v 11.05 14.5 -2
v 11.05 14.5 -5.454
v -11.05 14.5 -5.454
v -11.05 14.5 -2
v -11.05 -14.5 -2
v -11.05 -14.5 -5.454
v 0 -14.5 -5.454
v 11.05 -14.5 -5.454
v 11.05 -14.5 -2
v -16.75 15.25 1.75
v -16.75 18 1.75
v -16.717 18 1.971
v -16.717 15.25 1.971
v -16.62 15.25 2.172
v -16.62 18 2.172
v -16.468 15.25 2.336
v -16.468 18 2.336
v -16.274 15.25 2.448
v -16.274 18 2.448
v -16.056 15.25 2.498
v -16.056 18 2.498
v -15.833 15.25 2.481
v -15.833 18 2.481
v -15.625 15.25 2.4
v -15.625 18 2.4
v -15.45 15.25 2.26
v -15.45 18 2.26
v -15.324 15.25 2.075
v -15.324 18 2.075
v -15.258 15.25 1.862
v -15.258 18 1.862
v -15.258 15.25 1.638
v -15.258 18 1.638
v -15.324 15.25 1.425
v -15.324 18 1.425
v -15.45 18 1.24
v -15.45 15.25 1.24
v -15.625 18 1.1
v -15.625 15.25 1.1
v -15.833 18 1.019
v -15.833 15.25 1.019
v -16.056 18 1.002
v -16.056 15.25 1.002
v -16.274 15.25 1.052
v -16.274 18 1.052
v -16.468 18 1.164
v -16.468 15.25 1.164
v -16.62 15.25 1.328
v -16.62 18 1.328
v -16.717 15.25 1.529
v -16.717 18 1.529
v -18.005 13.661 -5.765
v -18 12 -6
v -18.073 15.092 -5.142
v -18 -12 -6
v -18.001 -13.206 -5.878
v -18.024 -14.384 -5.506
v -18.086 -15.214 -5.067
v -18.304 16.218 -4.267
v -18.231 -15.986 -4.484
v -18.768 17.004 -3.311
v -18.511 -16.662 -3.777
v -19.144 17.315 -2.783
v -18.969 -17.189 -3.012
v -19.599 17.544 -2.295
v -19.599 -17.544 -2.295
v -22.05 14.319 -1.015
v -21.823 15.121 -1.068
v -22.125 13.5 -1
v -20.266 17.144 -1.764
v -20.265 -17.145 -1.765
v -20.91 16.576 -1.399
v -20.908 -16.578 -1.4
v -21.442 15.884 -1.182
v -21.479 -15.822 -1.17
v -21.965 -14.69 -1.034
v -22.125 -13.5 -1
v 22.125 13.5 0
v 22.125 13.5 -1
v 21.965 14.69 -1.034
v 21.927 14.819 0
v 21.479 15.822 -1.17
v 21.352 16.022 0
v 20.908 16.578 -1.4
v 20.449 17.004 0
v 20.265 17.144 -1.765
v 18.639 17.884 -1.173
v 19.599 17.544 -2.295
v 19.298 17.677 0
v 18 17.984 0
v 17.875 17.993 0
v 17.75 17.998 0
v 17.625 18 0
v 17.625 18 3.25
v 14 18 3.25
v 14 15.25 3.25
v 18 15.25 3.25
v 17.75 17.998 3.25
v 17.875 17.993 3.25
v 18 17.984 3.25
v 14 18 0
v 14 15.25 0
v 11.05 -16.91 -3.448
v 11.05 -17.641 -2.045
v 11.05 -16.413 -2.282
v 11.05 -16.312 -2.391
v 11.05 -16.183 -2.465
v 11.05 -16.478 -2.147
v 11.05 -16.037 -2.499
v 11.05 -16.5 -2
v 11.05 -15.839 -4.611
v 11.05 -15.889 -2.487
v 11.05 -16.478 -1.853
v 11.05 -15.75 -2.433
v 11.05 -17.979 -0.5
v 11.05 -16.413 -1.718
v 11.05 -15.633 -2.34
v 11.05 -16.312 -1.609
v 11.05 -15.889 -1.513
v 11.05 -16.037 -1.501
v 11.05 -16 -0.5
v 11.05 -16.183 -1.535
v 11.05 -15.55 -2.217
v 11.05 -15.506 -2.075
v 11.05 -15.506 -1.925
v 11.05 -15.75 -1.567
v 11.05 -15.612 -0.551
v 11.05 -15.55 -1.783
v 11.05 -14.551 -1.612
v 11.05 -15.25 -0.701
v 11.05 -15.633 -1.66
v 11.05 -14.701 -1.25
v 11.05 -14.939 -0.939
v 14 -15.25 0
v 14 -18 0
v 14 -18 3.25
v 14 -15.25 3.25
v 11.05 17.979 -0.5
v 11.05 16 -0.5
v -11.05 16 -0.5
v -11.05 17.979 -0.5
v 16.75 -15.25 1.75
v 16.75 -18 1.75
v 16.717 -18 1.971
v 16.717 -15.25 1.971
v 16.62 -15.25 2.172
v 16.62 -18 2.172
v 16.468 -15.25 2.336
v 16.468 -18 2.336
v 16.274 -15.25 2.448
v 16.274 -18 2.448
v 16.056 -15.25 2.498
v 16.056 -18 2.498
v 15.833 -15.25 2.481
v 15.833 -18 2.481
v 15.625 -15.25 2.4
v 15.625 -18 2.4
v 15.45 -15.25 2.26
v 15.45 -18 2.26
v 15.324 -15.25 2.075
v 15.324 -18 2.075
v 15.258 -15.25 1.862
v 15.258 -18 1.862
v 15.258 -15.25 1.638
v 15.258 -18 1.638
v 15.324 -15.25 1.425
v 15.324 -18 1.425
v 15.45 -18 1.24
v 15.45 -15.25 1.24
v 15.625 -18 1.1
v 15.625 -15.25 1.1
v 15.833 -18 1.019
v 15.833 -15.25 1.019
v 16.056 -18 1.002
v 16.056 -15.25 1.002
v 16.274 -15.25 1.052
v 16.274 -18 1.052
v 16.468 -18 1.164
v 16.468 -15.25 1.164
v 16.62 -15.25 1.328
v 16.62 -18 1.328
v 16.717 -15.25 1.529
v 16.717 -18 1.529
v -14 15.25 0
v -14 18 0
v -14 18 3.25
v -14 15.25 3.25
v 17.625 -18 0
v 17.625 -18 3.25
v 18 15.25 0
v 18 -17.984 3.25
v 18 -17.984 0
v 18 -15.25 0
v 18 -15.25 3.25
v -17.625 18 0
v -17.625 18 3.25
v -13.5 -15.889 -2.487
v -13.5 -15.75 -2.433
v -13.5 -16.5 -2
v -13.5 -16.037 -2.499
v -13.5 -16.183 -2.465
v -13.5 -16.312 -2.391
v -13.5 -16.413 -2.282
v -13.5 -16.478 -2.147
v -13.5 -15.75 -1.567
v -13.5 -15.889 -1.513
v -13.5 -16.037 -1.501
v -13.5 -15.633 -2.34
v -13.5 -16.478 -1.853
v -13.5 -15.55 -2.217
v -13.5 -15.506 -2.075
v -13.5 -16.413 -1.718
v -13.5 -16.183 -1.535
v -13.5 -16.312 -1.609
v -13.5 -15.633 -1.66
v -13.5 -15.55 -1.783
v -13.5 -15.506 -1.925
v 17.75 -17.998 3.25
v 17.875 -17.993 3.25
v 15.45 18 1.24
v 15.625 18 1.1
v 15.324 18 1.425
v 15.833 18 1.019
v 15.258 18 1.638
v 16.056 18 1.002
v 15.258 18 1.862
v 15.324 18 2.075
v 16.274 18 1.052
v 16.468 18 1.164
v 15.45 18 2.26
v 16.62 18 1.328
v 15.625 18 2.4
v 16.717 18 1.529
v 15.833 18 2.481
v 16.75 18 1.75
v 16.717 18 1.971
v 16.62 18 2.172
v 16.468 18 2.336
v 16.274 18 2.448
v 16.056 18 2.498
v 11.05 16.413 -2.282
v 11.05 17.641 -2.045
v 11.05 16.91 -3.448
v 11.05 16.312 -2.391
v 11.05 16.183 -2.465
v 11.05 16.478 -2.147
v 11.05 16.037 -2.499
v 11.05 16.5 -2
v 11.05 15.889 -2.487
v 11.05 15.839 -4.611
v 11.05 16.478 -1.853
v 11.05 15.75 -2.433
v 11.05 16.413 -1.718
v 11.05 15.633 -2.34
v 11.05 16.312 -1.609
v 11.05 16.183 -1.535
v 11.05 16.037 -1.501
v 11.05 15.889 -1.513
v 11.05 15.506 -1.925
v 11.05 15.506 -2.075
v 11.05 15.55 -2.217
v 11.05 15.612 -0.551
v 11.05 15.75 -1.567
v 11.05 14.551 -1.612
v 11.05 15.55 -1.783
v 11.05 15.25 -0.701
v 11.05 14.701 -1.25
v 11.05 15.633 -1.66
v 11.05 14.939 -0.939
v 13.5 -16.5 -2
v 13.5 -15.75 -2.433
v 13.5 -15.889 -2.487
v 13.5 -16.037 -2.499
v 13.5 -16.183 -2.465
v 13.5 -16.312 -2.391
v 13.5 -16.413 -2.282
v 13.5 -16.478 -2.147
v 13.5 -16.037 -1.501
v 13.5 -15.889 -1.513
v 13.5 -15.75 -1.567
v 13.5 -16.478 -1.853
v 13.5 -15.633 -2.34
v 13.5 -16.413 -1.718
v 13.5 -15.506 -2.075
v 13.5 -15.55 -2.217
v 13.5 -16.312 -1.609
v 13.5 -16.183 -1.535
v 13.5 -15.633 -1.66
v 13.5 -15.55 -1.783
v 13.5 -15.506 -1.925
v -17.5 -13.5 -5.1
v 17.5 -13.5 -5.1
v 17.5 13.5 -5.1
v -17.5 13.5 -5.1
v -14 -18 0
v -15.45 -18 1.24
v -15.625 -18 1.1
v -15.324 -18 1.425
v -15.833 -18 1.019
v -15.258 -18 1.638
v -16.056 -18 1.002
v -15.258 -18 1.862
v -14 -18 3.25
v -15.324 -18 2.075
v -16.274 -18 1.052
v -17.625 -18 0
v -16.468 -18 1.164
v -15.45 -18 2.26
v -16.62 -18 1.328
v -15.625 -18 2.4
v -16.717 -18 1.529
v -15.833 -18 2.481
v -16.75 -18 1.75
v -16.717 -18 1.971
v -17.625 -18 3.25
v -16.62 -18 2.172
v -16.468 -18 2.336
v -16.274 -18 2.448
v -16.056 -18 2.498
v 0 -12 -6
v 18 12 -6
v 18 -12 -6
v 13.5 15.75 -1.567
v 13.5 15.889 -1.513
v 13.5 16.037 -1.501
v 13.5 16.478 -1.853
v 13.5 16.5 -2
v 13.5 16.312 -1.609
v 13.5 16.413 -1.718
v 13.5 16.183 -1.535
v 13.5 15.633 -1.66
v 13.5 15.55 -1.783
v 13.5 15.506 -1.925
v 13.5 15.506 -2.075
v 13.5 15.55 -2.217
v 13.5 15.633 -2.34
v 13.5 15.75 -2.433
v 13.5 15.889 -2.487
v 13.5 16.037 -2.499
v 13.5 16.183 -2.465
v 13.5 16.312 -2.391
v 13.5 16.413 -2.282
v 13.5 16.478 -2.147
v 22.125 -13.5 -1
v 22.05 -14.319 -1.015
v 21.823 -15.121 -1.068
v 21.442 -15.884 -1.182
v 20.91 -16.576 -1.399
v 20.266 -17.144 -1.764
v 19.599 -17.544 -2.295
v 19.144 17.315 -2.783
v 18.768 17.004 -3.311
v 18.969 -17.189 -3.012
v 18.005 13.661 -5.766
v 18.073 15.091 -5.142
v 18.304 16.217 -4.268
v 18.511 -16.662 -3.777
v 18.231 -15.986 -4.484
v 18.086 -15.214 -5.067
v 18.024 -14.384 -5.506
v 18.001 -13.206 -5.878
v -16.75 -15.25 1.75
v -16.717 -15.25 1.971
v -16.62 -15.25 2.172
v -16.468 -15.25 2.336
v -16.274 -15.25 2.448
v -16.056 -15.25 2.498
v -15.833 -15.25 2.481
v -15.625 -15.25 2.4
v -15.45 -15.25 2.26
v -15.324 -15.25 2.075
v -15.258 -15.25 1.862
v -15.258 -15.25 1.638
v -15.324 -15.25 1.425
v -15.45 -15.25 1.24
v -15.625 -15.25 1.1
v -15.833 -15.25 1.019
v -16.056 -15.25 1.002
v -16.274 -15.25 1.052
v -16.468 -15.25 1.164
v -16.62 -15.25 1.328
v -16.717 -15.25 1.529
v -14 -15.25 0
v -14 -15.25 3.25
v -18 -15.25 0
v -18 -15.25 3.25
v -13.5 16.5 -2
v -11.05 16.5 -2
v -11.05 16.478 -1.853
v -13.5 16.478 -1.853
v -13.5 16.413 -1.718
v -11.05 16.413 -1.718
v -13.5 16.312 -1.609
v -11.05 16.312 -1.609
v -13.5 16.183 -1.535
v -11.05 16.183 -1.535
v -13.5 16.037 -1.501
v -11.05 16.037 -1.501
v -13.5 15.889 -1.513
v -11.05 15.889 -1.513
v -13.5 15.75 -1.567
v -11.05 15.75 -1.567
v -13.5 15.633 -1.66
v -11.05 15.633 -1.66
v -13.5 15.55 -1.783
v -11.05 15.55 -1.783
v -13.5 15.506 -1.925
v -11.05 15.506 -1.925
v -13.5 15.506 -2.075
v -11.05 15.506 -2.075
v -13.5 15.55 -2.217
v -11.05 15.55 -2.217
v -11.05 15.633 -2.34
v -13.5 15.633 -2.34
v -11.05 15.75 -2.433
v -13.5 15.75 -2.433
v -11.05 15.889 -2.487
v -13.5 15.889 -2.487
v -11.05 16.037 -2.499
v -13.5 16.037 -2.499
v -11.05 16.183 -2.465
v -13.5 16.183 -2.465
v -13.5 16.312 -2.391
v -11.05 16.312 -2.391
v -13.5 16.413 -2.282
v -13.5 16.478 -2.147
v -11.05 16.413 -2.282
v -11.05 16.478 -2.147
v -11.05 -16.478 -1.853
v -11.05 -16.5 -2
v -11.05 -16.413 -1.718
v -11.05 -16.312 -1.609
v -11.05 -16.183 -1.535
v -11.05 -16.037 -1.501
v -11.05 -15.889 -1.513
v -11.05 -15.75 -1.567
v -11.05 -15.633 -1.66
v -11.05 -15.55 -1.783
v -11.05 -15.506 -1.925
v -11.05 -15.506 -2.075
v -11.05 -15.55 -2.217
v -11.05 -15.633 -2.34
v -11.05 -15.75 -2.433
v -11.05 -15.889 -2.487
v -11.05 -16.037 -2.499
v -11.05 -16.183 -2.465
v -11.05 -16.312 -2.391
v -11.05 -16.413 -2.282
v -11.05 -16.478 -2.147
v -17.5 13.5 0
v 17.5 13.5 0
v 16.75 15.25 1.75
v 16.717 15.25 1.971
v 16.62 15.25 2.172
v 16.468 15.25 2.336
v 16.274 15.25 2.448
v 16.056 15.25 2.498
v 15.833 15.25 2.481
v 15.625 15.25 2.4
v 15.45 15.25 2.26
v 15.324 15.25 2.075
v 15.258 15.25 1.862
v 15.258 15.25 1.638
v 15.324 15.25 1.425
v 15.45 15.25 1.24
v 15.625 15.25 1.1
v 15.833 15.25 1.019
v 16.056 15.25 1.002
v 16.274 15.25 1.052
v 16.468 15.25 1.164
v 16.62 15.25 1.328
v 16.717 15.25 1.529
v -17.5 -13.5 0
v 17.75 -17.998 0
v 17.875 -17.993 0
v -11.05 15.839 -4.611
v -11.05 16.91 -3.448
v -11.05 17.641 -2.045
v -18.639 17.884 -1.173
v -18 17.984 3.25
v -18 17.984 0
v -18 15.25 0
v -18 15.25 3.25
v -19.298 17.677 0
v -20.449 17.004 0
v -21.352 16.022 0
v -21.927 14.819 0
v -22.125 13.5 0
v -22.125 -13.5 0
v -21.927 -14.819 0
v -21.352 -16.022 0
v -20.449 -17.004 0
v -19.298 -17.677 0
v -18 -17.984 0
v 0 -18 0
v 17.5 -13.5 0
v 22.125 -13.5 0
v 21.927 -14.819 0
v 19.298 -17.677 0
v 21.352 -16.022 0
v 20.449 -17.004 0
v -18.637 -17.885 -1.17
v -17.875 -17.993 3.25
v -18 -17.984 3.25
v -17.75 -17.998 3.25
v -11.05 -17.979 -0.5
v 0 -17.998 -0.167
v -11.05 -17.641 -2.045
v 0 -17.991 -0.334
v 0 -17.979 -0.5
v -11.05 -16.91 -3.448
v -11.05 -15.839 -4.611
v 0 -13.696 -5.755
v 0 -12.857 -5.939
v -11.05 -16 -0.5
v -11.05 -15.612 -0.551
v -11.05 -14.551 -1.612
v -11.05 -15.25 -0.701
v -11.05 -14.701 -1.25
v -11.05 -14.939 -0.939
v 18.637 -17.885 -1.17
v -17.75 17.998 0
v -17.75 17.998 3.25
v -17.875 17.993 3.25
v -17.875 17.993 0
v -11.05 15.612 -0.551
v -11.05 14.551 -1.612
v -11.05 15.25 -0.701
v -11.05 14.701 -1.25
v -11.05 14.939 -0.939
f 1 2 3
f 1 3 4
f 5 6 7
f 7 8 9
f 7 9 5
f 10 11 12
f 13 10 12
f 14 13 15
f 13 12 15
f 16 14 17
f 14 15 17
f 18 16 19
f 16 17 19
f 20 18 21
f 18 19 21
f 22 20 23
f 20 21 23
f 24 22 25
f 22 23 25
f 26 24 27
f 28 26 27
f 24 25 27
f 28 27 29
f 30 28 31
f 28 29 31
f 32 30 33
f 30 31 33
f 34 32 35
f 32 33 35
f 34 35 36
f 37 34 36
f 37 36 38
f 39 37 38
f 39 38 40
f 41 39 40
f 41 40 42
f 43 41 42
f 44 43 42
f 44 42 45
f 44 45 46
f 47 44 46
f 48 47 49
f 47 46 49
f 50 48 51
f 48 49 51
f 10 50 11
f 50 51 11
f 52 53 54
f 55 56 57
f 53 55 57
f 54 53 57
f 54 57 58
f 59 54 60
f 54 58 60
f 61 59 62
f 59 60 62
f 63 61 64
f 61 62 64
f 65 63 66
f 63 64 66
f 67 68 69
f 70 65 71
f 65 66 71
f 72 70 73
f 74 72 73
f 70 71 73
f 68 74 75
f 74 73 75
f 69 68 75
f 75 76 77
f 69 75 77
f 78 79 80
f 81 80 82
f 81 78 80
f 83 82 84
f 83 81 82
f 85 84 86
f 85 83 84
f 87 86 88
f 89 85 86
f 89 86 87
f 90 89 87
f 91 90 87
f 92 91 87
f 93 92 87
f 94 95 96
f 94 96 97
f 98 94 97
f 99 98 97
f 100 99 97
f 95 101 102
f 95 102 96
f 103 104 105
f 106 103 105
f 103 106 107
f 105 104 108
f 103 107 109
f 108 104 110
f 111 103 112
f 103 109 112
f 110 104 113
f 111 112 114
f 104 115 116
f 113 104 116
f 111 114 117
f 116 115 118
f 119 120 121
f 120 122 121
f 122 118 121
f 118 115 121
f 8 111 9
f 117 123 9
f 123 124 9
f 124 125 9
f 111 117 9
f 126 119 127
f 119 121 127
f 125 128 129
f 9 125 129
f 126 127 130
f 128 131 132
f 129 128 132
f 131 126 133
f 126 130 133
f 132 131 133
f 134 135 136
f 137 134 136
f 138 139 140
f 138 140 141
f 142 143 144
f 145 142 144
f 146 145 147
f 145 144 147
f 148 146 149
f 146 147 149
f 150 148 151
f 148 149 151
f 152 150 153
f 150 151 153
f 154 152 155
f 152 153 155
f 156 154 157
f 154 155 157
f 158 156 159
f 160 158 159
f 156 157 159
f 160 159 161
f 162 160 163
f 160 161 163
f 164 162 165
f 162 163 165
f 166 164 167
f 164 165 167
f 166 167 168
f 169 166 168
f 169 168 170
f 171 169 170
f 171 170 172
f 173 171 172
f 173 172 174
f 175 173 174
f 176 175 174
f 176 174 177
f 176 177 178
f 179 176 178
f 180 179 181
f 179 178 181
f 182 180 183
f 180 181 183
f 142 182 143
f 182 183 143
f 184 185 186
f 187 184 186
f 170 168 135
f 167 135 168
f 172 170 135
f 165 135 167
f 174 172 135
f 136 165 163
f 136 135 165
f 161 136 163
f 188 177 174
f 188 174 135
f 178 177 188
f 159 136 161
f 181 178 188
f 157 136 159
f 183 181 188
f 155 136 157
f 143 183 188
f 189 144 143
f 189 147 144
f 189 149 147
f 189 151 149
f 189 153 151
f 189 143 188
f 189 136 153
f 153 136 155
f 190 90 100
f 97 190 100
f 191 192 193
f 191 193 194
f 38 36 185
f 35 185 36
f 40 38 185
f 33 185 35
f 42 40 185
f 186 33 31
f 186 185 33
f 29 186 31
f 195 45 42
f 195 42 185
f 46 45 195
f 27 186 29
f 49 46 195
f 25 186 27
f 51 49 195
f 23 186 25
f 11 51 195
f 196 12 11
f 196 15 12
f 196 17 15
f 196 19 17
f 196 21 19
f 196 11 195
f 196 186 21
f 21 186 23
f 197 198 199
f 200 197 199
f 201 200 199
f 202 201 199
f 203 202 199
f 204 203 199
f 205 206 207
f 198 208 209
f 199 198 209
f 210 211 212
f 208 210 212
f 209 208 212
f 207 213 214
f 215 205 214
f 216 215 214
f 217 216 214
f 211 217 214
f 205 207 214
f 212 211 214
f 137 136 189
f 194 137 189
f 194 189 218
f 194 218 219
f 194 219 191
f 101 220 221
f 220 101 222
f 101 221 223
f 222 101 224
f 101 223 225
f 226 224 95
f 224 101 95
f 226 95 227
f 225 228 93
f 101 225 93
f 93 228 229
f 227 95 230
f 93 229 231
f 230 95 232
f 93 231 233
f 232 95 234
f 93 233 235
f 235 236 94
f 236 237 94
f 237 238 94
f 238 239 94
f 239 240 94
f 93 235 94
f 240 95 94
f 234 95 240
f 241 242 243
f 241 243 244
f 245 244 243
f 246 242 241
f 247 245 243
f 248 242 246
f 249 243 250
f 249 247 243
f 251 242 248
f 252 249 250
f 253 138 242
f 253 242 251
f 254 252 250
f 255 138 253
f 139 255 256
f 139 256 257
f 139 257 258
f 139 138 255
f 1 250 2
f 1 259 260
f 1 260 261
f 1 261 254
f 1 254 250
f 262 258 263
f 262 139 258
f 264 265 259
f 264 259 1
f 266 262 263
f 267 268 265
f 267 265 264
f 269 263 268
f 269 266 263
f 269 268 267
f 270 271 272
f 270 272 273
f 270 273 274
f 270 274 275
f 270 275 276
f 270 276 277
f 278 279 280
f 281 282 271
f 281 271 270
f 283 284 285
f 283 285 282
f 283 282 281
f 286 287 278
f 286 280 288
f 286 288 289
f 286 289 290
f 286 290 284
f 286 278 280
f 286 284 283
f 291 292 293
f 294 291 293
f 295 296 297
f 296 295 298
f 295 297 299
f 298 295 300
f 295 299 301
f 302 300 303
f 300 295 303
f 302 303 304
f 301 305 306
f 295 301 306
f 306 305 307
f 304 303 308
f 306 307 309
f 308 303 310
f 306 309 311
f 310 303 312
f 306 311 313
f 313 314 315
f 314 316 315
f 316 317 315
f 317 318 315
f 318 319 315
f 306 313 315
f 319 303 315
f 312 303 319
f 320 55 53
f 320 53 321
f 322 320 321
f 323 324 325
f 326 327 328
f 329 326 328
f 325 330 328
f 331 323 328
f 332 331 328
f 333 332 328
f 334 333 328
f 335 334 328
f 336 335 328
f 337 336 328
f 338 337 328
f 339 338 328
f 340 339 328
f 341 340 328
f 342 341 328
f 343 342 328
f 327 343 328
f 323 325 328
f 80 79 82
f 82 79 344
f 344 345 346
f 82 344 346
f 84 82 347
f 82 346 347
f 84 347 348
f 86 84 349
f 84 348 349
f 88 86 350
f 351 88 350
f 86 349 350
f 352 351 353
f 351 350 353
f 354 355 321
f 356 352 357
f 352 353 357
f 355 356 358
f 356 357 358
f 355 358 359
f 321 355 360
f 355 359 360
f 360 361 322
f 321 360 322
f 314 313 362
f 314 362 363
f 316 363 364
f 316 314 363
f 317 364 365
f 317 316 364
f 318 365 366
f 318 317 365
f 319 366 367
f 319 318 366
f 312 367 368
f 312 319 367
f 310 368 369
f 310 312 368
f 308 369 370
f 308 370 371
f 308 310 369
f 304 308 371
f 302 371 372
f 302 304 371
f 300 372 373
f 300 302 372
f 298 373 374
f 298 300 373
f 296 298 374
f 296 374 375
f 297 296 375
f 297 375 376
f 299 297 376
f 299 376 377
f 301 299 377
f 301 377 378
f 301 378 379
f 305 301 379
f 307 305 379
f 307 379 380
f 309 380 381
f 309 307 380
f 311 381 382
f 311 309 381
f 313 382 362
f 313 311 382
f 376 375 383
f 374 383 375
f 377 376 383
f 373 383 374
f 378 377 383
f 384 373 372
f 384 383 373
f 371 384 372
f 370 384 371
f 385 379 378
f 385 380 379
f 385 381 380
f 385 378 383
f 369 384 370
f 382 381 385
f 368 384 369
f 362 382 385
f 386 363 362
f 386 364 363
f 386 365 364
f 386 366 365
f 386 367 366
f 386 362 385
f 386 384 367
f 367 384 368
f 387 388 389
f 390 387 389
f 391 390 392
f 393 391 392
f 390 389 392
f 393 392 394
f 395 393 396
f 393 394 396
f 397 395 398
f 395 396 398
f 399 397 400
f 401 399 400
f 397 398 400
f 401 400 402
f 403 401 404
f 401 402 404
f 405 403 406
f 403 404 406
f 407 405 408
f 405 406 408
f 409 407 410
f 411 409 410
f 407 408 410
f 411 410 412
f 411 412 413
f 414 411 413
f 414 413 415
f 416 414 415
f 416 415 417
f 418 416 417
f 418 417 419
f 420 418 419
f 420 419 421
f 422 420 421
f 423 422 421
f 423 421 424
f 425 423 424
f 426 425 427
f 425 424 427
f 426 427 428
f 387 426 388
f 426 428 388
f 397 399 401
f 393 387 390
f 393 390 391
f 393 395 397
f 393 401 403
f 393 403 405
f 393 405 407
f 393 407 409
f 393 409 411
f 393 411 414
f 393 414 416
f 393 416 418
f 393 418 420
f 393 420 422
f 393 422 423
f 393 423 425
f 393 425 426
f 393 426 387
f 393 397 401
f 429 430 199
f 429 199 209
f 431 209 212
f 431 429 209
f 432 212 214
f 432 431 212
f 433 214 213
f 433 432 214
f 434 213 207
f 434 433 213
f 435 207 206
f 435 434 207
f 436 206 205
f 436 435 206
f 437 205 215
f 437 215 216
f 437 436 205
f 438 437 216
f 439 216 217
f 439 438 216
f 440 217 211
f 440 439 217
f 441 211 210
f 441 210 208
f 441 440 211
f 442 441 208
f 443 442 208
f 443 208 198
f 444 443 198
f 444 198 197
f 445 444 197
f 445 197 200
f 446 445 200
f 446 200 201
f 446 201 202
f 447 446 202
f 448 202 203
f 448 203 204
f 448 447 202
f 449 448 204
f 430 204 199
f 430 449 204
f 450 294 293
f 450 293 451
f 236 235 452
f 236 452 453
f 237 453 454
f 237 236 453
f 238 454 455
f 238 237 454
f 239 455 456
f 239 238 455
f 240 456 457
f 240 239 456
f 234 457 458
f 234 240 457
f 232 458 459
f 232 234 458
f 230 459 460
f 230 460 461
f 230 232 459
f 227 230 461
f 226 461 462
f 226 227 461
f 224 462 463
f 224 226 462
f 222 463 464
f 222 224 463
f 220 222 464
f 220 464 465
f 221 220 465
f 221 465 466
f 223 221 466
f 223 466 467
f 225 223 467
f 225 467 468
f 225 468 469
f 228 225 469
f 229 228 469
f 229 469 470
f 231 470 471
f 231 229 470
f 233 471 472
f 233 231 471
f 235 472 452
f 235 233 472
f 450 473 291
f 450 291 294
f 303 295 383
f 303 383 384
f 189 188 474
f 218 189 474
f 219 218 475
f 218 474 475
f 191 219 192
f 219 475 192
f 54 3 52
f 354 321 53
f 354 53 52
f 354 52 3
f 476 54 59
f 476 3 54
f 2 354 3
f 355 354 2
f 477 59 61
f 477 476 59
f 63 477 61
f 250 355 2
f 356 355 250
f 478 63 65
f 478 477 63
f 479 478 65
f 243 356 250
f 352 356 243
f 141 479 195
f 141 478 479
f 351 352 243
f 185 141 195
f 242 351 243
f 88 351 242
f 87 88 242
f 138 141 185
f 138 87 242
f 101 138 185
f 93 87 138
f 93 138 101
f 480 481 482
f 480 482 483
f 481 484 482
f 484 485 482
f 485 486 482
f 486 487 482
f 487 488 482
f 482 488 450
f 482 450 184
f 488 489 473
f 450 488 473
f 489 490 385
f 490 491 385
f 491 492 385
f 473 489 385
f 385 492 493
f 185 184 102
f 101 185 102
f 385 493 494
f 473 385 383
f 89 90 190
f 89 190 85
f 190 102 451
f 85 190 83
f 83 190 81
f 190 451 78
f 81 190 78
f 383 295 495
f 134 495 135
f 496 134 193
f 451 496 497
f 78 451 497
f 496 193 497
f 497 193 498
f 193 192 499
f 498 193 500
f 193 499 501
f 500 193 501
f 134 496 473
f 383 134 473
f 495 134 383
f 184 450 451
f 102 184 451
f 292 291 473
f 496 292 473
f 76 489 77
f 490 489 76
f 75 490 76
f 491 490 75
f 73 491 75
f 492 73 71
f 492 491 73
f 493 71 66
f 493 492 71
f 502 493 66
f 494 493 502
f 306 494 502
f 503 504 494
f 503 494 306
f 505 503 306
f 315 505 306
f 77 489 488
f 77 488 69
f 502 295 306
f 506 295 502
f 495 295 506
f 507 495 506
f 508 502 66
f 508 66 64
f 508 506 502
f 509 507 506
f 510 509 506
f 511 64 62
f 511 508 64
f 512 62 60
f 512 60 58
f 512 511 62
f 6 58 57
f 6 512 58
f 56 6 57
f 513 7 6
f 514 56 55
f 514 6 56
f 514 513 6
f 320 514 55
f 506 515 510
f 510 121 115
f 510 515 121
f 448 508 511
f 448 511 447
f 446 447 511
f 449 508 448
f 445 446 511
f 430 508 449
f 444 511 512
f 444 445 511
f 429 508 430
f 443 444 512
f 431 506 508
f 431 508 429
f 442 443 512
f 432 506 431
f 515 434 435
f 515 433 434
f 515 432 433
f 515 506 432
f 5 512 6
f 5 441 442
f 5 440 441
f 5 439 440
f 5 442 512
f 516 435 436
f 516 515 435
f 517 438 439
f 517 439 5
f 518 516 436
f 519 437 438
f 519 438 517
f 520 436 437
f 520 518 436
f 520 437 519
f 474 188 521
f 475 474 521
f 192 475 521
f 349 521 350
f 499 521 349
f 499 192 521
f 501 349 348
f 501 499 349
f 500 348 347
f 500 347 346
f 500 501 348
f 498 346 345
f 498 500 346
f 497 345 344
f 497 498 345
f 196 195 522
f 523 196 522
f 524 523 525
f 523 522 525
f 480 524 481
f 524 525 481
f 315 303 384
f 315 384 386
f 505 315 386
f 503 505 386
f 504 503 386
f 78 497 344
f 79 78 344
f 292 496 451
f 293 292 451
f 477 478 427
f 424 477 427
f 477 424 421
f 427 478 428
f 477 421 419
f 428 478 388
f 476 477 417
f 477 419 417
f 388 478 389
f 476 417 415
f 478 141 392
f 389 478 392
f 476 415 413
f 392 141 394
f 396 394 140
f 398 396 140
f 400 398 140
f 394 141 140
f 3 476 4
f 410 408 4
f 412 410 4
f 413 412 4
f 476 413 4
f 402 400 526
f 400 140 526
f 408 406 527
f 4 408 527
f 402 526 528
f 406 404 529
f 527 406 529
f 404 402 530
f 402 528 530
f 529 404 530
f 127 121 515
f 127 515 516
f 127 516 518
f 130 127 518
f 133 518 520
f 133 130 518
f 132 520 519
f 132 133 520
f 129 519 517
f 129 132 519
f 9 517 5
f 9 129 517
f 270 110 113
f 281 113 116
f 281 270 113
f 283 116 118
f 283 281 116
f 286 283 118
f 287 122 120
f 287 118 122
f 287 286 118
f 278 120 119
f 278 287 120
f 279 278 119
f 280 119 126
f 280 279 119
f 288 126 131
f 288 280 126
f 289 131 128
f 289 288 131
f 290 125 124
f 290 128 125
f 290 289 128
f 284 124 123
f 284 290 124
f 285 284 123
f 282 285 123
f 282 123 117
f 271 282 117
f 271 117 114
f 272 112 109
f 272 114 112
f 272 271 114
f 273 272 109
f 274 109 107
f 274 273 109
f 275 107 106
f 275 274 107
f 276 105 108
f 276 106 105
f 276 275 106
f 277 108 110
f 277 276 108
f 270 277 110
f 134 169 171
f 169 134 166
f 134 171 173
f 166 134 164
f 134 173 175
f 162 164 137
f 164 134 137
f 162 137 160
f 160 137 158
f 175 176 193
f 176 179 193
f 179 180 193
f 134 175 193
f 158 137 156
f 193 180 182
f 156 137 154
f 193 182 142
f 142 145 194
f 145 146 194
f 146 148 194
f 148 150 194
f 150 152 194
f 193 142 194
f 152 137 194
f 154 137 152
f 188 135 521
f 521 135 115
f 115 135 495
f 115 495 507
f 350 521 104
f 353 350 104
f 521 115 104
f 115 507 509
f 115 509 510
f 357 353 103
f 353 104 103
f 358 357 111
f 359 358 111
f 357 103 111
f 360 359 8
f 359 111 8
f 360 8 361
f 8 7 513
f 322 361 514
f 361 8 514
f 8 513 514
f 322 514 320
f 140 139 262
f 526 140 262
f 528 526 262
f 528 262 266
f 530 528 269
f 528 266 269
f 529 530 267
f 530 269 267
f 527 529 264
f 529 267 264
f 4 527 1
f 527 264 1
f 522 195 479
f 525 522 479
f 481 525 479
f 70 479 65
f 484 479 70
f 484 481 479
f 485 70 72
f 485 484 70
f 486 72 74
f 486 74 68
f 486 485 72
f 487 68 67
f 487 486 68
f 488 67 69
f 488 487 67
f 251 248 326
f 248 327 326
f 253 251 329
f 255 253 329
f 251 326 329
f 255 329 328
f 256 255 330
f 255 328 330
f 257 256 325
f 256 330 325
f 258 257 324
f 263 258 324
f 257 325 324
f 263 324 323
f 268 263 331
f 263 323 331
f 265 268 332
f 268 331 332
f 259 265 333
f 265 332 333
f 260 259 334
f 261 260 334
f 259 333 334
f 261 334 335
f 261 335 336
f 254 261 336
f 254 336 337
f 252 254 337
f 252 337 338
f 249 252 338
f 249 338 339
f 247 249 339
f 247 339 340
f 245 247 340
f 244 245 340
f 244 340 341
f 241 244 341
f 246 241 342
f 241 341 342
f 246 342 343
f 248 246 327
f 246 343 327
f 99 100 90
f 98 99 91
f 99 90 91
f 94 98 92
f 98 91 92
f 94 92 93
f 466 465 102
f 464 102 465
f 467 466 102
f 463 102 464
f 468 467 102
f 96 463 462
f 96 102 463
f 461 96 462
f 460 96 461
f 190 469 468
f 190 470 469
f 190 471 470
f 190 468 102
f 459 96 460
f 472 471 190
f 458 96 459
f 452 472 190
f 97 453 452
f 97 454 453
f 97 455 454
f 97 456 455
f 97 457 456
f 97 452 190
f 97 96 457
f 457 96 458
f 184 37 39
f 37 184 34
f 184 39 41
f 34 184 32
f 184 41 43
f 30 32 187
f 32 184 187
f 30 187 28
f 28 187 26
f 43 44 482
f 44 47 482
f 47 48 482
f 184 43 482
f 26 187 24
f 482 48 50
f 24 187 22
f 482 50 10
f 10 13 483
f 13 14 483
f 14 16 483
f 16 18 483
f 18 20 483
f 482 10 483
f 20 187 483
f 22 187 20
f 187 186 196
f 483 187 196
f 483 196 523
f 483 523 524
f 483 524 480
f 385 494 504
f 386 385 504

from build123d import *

# Parameters (mm, degrees)
PAD003_DEPTH               = 18
POCKET008_DEPTH            = 22.126
POCKET008_DEPTH_BACK       = 22.126
SKETCH014_W                = 27
SKETCH014_H                = 5.1
POCKET009_DEPTH            = 17.5
POCKET010_DEPTH            = 11.05
SKETCH016_R                = 0.5
POCKET011_DEPTH            = 13.5
SKETCH018_W                = 4
SKETCH018_H                = 3.25
SKETCH018_R                = 0.75
PAD004_DEPTH               = 2.75
SKETCH018_MIRRORED005_2_W  = 4
SKETCH018_MIRRORED005_2_H  = 3.25
SKETCH018_MIRRORED005_2_R  = 0.75
PAD004_MIRRORED005_2_DEPTH = 2.75
SKETCH010_W                = 70
SKETCH010_H                = 70
POCKET013_DEPTH            = 6.001
POCKET013_DEPTH_BACK       = 3.251


with BuildPart() as part:
    # Sketch009 → Pad003 (new body, symmetric)
    with BuildSketch(Plane.XZ):
        with BuildLine():
            Line((-22.125, 0), (22.125, 0))
            Line((22.125, 0), (22.125, -1))
            ThreePointArc((22.125, -1), (19.164351, -2.759027), (18, -6))
            Line((-18, -6), (18, -6))
            ThreePointArc((-18, -6), (-19.164351, -2.759027), (-22.125, -1))
            Line((-22.125, 0), (-22.125, -1))
        make_face()
    extrude(amount=PAD003_DEPTH, both=True)

    # Sketch013 → Pocket008 (cut, two sides)
    with BuildSketch(Plane.YZ) as pocket008_sk:
        with BuildLine():
            ThreePointArc((-18, 0), (-16.242641, -4.242641), (-12, -6))
            Line((-12, -6), (-18, -6))
            Line((-18, 0), (-18, -6))
        make_face()
        with BuildLine():
            ThreePointArc((12, -6), (16.242641, -4.242641), (18, 0))
            Line((18, 0), (18, -6))
            Line((12, -6), (18, -6))
        make_face()
    extrude(amount=-POCKET008_DEPTH, mode=Mode.SUBTRACT)
    extrude(pocket008_sk.sketch, amount=POCKET008_DEPTH_BACK, mode=Mode.SUBTRACT)

    # Sketch014 → Pocket009 (cut, symmetric)
    with BuildSketch(Plane.YZ):
        with Locations((0, -2.55)):
            Rectangle(SKETCH014_W, SKETCH014_H)
    pocket009 = extrude(amount=POCKET009_DEPTH, both=True, mode=Mode.SUBTRACT)

    # Sketch015 → Pocket010 (cut, symmetric)
    with BuildSketch(Plane.YZ):
        with BuildLine():
            Line((16, -0.5), (18, -0.5))
            Line((18, -0.5), (18, -6))
            Line((18, -6), (14.5, -6))
            Line((14.5, -6), (14.5, -2))
            ThreePointArc((16, -0.5), (14.93934, -0.93934), (14.5, -2))
        make_face()
    pocket010 = extrude(amount=POCKET010_DEPTH, both=True, mode=Mode.SUBTRACT)

    # Sketch016 → Pocket011 (cut, symmetric)
    with BuildSketch(Plane.YZ):
        with Locations((16, -2)):
            Circle(SKETCH016_R)
    pocket011 = extrude(amount=POCKET011_DEPTH, both=True, mode=Mode.SUBTRACT)

    # Mirrored004: Pocket009, Pocket010, Pocket011 across Sketch014 V_Axis
    add(pocket009.mirror(Plane(origin=(0, 0, 0), x_dir=(1, 0, 0), z_dir=(0, 1, 0))), mode=Mode.SUBTRACT)
    add(pocket010.mirror(Plane(origin=(0, 0, 0), x_dir=(1, 0, 0), z_dir=(0, 1, 0))), mode=Mode.SUBTRACT)
    add(pocket011.mirror(Plane(origin=(0, 0, 0), x_dir=(1, 0, 0), z_dir=(0, 1, 0))), mode=Mode.SUBTRACT)

    # Sketch018 → Pad004 (join)
    with BuildSketch(Plane.XZ.offset(-18)):
        with Locations((16, 1.625)):
            Rectangle(SKETCH018_W, SKETCH018_H)
        with Locations((16, 1.75)):
            Circle(SKETCH018_R, mode=Mode.SUBTRACT)
    pad004 = extrude(amount=PAD004_DEPTH)

    # Sketch018 Mirrored005 2 → Pad004 Mirrored005 2 (add)
    with BuildSketch(Plane(origin=(0, 18, 0), x_dir=(-1, 0, 0), z_dir=(0, 1, 0))):
        with Locations((16, 1.625)):
            Rectangle(SKETCH018_MIRRORED005_2_W, SKETCH018_MIRRORED005_2_H)
        with Locations((16, 1.75)):
            Circle(SKETCH018_MIRRORED005_2_R, mode=Mode.SUBTRACT)
    pad004_mirrored005_2 = extrude(amount=-PAD004_MIRRORED005_2_DEPTH)

    # Mirrored006: Pad004, Pad004 Mirrored005 2 across XZ
    add(pad004.mirror(Plane.XZ))
    add(pad004_mirrored005_2.mirror(Plane.XZ))

    # Sketch010 → Pocket013 (cut, two sides)
    with BuildSketch(Plane.XY) as pocket013_sk:
        Rectangle(SKETCH010_W, SKETCH010_H)
        with BuildLine():
            ThreePointArc((-17.625, 18), (-20.806981, 16.681981), (-22.125, 13.5))
            Line((-22.125, 13.5), (-22.125, -13.5))
            ThreePointArc((-22.125, -13.5), (-20.806981, -16.681981), (-17.625, -18))
            Line((-17.625, -18), (17.625, -18))
            ThreePointArc((17.625, -18), (20.806981, -16.681981), (22.125, -13.5))
            Line((22.125, 13.5), (22.125, -13.5))
            ThreePointArc((22.125, 13.5), (20.806981, 16.681981), (17.625, 18))
            Line((17.625, 18), (-17.625, 18))
        make_face(mode=Mode.SUBTRACT)
    extrude(amount=-POCKET013_DEPTH, mode=Mode.SUBTRACT)
    extrude(pocket013_sk.sketch, amount=POCKET013_DEPTH_BACK, mode=Mode.SUBTRACT)


solid = part.part
